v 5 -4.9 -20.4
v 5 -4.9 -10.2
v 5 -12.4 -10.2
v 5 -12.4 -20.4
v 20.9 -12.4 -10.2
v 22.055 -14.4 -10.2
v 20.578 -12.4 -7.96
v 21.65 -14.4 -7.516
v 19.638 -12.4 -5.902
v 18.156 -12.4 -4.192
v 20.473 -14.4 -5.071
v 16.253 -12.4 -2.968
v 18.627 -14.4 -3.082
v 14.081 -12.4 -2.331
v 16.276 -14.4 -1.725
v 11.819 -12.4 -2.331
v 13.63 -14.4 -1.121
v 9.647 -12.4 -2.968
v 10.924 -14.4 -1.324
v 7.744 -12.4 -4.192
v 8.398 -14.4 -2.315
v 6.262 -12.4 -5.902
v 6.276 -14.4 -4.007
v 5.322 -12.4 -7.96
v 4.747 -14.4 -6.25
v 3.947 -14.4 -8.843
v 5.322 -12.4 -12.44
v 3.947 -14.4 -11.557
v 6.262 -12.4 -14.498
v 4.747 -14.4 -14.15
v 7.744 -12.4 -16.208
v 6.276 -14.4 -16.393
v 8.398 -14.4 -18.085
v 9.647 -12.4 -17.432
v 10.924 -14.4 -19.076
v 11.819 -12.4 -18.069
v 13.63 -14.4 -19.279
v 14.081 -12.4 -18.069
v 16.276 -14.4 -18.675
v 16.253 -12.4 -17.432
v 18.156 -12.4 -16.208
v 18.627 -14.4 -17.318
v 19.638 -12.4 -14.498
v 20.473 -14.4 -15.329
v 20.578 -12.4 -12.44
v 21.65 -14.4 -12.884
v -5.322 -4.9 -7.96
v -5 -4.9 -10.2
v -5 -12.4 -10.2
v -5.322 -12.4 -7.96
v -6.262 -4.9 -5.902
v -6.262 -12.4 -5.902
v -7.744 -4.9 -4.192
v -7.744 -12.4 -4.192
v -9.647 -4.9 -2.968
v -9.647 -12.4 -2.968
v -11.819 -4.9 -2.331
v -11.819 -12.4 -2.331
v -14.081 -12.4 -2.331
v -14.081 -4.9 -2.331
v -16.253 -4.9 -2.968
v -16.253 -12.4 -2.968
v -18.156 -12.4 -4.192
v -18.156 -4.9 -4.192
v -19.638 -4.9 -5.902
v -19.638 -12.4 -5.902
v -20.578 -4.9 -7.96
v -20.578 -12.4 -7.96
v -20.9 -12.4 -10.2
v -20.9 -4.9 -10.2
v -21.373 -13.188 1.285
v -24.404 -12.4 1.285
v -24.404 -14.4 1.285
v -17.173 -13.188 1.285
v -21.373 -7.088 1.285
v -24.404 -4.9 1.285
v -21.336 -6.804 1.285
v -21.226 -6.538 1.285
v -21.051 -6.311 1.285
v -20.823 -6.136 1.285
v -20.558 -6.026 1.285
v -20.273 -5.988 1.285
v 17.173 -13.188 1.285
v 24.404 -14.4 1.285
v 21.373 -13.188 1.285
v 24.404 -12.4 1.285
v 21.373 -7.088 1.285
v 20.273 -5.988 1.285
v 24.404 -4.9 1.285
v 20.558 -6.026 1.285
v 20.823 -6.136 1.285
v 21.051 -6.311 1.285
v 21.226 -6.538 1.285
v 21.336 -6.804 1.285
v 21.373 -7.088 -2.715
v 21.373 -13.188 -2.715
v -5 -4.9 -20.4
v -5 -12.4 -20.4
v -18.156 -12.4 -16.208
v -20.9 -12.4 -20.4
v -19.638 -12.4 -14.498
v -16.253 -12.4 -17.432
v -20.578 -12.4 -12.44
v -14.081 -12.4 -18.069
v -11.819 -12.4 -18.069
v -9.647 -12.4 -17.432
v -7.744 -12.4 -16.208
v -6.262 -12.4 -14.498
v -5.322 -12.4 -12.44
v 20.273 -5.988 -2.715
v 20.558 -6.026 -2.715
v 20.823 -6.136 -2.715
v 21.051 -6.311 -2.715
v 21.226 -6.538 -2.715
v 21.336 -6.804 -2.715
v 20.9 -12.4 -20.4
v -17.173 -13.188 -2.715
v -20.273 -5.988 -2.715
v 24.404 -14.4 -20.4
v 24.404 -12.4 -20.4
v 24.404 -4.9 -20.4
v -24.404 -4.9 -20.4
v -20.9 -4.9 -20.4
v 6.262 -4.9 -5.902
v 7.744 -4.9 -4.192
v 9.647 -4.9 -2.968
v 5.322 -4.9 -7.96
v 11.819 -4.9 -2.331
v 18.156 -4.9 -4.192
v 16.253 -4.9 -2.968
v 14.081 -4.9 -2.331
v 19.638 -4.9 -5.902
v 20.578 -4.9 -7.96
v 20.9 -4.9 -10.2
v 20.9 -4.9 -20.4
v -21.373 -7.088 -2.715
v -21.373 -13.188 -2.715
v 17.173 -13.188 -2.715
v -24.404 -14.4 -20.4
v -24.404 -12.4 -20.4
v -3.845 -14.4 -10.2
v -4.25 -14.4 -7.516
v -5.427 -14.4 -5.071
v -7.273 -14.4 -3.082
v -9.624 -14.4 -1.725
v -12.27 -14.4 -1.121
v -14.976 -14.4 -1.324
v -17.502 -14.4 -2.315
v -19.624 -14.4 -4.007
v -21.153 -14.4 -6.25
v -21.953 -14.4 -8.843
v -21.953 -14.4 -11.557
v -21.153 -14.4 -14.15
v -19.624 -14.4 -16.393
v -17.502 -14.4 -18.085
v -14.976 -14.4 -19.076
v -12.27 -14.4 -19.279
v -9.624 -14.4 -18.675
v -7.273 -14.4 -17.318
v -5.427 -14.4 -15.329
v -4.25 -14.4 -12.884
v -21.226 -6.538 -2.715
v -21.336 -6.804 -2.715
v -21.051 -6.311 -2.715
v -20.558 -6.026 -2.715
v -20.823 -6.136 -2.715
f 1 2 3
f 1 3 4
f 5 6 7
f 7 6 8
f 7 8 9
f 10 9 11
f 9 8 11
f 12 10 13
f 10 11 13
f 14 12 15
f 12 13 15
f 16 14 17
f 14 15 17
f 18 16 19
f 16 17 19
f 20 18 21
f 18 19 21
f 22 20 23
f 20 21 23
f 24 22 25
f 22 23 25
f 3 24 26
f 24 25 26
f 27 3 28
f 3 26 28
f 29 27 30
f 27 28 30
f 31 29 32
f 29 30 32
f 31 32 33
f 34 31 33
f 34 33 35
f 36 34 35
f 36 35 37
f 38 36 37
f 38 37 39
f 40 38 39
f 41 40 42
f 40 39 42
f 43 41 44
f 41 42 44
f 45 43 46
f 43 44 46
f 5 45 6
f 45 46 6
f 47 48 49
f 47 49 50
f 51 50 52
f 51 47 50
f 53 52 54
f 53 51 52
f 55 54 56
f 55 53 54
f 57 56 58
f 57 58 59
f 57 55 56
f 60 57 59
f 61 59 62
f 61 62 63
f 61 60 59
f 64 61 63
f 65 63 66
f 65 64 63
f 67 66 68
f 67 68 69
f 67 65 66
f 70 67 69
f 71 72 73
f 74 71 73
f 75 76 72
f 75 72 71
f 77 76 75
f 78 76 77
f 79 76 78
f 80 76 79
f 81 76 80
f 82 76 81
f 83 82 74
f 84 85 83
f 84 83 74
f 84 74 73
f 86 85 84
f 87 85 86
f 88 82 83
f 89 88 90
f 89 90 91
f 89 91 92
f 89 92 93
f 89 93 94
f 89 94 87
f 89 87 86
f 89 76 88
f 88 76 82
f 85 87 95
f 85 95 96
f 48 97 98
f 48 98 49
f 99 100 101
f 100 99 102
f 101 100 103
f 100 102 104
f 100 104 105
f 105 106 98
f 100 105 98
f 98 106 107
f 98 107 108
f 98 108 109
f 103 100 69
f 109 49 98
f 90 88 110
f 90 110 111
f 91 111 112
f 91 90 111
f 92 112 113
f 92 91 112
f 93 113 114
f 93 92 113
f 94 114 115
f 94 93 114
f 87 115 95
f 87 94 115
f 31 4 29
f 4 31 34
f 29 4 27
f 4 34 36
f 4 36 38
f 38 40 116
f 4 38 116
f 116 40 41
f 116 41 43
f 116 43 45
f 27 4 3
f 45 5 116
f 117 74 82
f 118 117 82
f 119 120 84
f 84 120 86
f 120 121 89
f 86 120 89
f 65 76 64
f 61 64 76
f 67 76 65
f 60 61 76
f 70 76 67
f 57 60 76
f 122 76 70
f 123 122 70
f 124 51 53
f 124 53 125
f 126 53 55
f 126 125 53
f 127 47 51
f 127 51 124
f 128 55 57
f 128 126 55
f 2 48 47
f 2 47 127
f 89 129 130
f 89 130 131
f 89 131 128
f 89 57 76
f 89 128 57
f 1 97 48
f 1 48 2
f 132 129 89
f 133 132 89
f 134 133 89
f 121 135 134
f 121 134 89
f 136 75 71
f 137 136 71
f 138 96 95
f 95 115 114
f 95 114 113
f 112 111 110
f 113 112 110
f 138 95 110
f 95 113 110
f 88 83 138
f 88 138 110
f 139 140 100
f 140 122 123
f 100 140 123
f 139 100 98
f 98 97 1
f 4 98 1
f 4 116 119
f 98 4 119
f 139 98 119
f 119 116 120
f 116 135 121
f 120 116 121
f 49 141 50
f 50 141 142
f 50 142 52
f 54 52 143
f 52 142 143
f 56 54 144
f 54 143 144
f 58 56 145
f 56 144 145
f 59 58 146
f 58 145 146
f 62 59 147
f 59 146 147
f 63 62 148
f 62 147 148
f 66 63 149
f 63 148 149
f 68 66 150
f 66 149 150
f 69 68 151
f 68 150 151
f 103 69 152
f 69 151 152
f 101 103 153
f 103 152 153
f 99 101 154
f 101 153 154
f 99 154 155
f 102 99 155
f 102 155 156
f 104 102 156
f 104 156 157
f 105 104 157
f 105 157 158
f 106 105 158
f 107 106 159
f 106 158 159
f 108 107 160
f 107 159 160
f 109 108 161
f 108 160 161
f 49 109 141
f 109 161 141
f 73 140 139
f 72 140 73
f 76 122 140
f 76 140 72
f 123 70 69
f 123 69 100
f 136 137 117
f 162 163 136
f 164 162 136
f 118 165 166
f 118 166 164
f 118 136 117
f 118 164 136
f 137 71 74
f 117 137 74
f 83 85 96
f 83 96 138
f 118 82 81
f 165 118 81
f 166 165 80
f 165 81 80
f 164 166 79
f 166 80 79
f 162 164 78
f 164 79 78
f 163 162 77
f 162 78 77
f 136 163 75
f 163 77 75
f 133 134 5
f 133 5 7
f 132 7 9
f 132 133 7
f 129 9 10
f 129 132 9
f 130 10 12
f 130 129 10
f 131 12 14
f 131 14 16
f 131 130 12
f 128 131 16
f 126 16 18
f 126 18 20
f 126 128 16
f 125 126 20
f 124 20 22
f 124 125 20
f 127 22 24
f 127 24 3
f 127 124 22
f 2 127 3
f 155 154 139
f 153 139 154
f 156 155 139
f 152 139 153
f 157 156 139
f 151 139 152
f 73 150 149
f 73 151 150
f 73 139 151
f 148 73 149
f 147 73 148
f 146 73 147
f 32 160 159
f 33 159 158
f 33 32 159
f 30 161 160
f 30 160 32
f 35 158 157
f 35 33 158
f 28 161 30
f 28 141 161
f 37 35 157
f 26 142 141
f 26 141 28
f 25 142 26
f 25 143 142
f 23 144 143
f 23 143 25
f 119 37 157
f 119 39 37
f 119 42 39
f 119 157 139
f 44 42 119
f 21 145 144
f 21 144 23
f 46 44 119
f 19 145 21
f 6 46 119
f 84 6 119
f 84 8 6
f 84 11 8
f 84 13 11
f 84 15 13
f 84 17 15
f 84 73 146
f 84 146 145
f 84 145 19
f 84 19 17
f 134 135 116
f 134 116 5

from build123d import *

# Parameters (mm, degrees)
SALIENTE_EXTRUIR1_DEPTH = 7.5
CROQUIS3_W              = 48.808095268
CROQUIS3_H              = 21.684781413
SALIENTE_EXTRUIR2_DEPTH = 2
CROQUIS4_R              = 7.95
CORTAR_EXTRUIR1_DEPTH   = 3
CORTAR_EXTRUIR1_TAPER   = -30
CORTAR_EXTRUIR2_DEPTH   = 4


with BuildPart() as part:
    # Croquis2 → Saliente-Extruir1 (new body)
    with BuildSketch(Plane(origin=(0, -4.9, 0), x_dir=(-1, 0, 0), z_dir=(0, -1, 0))):
        with BuildLine():
            Line((-5, 20.4), (5, 20.4))
            Line((5, 20.4), (5, 10.2))
            ThreePointArc((5, 10.2), (12.95, 2.25), (20.9, 10.2))
            Line((20.9, 10.2), (20.9, 20.4))
            Line((20.9, 20.4), (24.404047634, 20.4))
            Line((24.404047634, 20.4), (24.404047634, -1.284781413))
            Line((24.404047634, -1.284781413), (-24.404047634, -1.284781413))
            Line((-24.404047634, -1.284781413), (-24.404047634, 20.4))
            Line((-24.404047634, 20.4), (-20.9, 20.4))
            Line((-20.9, 20.4), (-20.9, 10.2))
            ThreePointArc((-20.9, 10.2), (-12.95, 2.25), (-5, 10.2))
            Line((-5, 10.2), (-5, 20.4))
        make_face()
    extrude(amount=SALIENTE_EXTRUIR1_DEPTH)

    # Croquis3 → Saliente-Extruir2 (add)
    with BuildSketch(Plane.XZ.offset(12.4)):
        with Locations((0, -9.557609294)):
            Rectangle(CROQUIS3_W, CROQUIS3_H)
    extrude(amount=SALIENTE_EXTRUIR2_DEPTH)

    # Croquis4 → Cortar-Extruir1 (cut)
    with BuildSketch(Plane.XZ.offset(12.4)):
        with Locations((-12.95, -10.2)):
            Circle(CROQUIS4_R)
        with Locations((12.95, -10.2)):
            Circle(CROQUIS4_R)
    extrude(amount=CORTAR_EXTRUIR1_DEPTH, taper=CORTAR_EXTRUIR1_TAPER, mode=Mode.SUBTRACT)

    # Croquis7 → Cortar-Extruir2 (cut)
    with BuildSketch(Plane.XY.offset(1.284781413)):
        with BuildLine():
            Line((-21.373206473, -7.088443063), (-21.373206473, -13.188443063))
            Line((-21.373206473, -13.188443063), (-17.173206473, -13.188443063))
            Line((-17.173206473, -13.188443063), (-20.273206473, -5.988443063))
            ThreePointArc((-20.273206473, -5.988443063), (-21.051023932, -6.310625604), (-21.373206473, -7.088443063))
        make_face()
        with BuildLine():
            Line((21.373206473, -13.188443063), (17.173206473, -13.188443063))
            Line((17.173206473, -13.188443063), (20.273206473, -5.988443063))
            ThreePointArc((20.273206473, -5.988443063), (21.051023932, -6.310625604), (21.373206473, -7.088443063))
            Line((21.373206473, -7.088443063), (21.373206473, -13.188443063))
        make_face()
    extrude(amount=-CORTAR_EXTRUIR2_DEPTH, mode=Mode.SUBTRACT)


solid = part.part
